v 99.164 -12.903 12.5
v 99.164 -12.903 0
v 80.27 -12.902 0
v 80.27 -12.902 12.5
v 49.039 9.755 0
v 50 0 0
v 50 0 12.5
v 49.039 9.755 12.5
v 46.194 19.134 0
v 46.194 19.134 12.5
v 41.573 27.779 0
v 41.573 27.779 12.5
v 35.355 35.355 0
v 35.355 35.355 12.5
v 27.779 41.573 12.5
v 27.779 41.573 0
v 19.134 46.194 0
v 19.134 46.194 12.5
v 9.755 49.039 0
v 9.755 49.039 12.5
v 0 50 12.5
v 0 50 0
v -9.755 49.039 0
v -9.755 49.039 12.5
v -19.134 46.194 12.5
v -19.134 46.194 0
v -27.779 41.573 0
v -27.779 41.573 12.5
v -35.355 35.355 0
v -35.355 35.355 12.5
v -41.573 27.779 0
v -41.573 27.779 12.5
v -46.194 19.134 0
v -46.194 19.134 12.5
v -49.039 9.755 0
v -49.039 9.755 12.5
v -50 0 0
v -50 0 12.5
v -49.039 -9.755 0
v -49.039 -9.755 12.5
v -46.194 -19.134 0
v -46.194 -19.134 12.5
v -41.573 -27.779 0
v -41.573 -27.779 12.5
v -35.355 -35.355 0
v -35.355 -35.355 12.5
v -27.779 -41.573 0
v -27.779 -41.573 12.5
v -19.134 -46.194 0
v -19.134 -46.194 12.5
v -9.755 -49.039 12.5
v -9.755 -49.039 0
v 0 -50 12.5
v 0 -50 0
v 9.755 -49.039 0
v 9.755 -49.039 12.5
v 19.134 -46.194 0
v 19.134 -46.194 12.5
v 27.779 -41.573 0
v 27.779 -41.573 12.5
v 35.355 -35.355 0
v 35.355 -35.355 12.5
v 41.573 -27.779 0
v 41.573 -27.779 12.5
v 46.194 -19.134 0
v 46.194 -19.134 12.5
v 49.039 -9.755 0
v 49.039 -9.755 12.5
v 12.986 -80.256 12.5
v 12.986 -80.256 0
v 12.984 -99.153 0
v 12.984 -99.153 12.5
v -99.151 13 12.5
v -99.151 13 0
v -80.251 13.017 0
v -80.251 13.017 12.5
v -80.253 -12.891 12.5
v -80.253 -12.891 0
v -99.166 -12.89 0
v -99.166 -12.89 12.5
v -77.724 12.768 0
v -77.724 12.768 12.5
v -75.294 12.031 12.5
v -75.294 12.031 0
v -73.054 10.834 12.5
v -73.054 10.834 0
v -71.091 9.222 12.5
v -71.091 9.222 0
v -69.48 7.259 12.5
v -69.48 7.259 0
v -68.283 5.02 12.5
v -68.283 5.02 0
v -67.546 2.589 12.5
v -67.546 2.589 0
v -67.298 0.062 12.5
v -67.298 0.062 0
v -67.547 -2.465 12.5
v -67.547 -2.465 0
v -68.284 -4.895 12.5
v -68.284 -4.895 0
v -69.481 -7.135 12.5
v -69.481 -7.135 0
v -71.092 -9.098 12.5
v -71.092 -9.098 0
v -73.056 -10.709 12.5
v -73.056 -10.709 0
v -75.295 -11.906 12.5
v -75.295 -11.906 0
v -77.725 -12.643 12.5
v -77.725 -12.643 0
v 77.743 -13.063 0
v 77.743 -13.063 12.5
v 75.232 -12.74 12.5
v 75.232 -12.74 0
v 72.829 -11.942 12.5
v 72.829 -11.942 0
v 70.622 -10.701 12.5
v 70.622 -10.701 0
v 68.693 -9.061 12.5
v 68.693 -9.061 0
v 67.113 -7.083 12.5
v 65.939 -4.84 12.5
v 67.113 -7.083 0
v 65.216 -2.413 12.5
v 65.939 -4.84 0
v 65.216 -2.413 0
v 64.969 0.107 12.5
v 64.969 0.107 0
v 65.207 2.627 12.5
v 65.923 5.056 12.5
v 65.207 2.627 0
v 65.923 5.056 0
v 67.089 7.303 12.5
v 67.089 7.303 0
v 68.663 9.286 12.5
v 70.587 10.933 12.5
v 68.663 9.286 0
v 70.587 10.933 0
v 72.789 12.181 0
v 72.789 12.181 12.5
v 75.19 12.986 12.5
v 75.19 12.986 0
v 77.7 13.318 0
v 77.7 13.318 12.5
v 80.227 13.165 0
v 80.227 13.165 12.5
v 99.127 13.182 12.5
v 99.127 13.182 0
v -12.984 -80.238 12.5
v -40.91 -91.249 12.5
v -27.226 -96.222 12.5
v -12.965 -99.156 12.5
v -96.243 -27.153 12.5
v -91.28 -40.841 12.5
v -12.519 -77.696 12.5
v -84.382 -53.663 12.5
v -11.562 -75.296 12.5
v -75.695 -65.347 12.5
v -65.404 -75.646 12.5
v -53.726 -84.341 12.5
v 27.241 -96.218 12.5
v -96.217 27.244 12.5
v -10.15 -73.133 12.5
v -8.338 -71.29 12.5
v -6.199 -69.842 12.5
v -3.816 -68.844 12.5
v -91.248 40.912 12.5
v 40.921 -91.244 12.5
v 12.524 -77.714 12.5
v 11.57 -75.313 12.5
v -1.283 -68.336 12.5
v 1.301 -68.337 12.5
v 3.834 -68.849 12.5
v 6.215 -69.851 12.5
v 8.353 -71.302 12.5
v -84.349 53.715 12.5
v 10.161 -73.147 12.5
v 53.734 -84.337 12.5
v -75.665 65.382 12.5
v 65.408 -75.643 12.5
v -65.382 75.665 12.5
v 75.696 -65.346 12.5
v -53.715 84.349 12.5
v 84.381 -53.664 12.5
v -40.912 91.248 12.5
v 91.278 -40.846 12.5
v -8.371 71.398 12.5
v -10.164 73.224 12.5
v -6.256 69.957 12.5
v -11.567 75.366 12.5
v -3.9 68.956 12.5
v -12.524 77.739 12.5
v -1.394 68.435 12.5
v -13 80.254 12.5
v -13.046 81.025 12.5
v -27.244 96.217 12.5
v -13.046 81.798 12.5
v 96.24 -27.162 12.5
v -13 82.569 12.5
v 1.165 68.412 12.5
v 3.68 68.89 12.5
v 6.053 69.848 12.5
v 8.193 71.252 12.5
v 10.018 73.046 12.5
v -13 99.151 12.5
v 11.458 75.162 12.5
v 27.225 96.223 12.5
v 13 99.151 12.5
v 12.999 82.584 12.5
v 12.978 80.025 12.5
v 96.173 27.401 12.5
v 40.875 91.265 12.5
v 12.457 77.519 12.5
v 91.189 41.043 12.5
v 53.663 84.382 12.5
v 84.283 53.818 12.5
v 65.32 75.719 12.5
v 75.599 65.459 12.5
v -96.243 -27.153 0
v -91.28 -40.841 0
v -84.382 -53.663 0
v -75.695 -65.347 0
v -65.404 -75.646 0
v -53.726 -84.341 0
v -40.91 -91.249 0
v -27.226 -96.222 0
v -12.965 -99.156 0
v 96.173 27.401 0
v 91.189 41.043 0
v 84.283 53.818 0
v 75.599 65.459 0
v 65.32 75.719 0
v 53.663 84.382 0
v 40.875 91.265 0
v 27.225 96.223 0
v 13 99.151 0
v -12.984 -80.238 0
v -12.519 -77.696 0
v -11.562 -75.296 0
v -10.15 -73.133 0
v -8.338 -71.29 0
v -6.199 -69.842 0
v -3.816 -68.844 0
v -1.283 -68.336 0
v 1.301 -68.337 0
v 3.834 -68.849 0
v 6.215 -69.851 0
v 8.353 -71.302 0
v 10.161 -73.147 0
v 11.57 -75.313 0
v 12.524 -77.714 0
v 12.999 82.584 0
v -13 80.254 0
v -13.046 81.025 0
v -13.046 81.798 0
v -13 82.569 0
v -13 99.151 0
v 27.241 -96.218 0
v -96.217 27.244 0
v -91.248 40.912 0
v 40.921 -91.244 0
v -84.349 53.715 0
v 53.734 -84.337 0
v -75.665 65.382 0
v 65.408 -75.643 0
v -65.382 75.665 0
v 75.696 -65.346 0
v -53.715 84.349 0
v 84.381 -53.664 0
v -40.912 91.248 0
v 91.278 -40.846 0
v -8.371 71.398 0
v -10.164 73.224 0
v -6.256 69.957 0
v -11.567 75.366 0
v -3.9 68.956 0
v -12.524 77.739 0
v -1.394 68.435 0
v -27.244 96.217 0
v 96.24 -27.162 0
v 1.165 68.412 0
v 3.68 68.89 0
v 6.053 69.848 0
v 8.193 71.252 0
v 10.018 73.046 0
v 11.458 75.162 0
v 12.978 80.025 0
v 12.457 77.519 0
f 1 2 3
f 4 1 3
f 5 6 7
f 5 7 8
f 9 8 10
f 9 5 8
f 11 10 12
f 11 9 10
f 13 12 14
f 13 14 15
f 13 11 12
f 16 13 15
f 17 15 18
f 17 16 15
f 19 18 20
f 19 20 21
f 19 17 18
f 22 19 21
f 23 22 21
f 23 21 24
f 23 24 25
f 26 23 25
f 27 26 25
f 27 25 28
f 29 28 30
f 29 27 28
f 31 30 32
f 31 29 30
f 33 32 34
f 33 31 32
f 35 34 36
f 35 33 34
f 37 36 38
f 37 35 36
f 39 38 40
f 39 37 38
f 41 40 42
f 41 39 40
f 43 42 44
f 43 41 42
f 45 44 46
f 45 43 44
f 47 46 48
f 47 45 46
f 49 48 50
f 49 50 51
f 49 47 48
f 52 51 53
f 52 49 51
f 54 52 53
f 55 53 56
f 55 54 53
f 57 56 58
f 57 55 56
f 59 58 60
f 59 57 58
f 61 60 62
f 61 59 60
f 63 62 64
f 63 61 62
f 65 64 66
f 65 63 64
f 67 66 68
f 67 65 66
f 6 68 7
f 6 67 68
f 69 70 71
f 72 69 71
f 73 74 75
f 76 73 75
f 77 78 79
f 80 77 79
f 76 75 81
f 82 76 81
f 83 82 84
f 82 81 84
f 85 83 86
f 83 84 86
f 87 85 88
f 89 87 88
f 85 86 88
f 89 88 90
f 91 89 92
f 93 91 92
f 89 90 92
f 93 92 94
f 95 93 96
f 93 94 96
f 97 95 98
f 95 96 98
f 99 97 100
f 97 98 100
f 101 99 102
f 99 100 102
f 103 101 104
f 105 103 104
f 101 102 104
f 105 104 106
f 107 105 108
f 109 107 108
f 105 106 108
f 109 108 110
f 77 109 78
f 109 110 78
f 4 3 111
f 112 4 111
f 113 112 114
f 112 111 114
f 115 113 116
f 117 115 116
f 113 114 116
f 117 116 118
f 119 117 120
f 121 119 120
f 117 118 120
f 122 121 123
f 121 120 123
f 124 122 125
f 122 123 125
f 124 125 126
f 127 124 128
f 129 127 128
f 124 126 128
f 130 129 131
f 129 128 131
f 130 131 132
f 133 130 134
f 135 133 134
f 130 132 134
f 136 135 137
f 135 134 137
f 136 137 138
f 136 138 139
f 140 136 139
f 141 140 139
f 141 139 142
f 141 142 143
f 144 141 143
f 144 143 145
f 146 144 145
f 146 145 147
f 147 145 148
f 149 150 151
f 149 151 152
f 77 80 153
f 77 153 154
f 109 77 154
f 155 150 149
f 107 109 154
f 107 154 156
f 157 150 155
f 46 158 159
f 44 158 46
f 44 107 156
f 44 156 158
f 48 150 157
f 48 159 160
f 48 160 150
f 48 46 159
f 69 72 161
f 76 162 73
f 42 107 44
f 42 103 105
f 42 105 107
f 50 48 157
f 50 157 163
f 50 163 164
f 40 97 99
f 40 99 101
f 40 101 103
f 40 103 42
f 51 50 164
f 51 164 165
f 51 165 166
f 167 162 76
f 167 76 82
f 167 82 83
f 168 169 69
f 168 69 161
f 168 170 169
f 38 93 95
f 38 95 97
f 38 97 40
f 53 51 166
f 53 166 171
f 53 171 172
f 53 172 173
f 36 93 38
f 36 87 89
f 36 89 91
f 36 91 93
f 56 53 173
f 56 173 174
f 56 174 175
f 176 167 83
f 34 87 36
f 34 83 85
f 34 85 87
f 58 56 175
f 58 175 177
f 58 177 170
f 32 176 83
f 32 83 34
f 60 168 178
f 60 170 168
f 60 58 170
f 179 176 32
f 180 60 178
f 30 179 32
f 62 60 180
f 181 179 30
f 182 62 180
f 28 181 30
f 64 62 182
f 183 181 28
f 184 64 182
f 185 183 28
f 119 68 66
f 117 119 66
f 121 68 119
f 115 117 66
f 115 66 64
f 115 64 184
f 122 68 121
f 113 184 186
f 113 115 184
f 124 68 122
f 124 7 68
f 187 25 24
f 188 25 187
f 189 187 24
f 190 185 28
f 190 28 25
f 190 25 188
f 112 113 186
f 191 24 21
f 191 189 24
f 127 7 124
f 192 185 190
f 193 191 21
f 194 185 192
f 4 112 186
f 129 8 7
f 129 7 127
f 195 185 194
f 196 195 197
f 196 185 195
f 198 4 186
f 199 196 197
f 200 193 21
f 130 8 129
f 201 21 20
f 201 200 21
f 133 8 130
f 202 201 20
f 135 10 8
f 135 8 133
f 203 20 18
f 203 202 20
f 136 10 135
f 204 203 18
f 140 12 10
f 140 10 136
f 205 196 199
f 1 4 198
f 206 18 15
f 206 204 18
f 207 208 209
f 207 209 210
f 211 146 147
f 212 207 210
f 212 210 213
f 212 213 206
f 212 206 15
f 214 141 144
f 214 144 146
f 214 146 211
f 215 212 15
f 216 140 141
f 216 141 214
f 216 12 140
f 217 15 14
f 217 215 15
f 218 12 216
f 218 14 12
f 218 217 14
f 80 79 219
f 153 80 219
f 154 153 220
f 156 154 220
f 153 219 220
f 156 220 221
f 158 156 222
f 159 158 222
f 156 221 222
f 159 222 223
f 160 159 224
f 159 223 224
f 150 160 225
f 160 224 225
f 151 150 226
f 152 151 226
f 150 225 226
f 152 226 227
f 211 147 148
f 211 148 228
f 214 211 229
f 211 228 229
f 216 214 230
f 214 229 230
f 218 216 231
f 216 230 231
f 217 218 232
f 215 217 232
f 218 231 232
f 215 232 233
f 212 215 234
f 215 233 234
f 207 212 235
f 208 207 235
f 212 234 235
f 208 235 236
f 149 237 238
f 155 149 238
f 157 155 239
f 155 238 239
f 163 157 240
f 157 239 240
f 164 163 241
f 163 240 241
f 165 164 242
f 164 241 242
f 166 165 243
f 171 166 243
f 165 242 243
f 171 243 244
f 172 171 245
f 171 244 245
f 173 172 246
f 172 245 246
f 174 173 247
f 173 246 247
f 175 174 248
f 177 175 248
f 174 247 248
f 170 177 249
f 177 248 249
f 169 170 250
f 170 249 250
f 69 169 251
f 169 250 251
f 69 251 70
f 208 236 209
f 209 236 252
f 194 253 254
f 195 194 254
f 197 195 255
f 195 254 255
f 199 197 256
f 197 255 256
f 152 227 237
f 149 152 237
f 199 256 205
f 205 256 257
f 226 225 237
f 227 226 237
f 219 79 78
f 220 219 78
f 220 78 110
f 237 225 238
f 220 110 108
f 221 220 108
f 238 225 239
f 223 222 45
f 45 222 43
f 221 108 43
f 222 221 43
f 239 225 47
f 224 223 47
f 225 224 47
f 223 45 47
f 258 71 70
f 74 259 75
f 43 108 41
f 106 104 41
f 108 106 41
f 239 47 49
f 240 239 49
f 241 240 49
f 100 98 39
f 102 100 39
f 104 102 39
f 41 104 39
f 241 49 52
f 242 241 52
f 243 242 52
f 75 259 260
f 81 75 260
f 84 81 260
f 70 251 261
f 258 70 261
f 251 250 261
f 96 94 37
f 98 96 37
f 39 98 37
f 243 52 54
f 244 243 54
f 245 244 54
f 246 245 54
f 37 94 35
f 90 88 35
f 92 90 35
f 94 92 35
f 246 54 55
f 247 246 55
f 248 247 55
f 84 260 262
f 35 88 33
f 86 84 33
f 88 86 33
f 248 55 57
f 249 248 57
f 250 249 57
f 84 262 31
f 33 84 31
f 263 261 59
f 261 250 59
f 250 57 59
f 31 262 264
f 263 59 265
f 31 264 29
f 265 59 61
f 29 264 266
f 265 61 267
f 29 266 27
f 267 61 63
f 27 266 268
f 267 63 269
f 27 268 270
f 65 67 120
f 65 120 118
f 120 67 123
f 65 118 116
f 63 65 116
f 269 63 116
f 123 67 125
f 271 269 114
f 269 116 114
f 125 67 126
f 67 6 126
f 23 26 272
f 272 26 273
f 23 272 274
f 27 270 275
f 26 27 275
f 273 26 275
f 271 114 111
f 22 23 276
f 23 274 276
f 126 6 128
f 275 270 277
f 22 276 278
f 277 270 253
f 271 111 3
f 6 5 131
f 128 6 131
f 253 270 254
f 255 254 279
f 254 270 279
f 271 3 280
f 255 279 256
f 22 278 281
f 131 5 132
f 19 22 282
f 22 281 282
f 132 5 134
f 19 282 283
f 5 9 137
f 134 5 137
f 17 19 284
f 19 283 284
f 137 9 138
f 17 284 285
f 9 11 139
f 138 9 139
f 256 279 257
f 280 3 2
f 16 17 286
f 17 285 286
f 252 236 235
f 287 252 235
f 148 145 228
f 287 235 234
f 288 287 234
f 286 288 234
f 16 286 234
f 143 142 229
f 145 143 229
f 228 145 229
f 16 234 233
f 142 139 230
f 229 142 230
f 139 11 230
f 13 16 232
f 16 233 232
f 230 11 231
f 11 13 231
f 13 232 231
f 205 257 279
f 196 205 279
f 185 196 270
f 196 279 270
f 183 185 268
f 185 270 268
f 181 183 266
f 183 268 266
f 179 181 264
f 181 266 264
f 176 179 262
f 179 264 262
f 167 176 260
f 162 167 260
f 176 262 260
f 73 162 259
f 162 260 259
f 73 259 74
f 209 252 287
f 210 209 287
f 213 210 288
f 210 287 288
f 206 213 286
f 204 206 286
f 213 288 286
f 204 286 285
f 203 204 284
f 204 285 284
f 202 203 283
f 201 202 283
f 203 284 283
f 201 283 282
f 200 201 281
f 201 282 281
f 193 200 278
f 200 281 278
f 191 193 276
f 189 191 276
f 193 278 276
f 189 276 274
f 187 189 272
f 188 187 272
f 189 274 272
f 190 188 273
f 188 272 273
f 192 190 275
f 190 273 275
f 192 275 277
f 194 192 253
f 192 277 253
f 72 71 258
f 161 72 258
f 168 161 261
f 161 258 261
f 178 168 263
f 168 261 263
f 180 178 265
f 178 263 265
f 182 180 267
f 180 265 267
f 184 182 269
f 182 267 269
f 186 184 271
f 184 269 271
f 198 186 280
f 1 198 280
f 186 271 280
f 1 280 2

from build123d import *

# Parameters (mm, degrees)
SKETCH1_R           = 50
BOSS_EXTRUDE1_DEPTH = 12.5


with BuildPart() as part:
    # Sketch1 → Boss-Extrude1 (new body)
    with BuildSketch(Plane.XY):
        with BuildLine():
            ThreePointArc((80.269796006, -12.90154445), (64.968632792, 0.106555165), (80.22704459, 13.164775589))
            Line((80.22704459, 13.164775589), (99.127347992, 13.182142467))
            ThreePointArc((99.127347992, 13.182142467), (70.645692195, 70.775604372), (13, 99.151399385))
            Line((13, 99.151399385), (12.998692028, 82.58389221))
            ThreePointArc((12.998692028, 82.58389221), (1.164991508, 68.412255439), (-13, 80.253909562))
            ThreePointArc((-13, 80.253909562), (-13.051446481, 81.411603502), (-13, 82.569297441))
            Line((-13, 82.569297441), (-13, 99.151399385))
            ThreePointArc((-13, 99.151399385), (-70.710695757, 70.71066048), (-99.151405871, 12.999950534))
            Line((-99.151405871, 12.999950534), (-80.251102468, 13.017317412))
            ThreePointArc((-80.251102468, 13.017317412), (-67.29756358, 0.062140866), (-80.252740126, -12.891398023))
            Line((-80.252740126, -12.891398023), (-99.165733386, -12.890202557))
            ThreePointArc((-99.165733386, -12.890202557), (-70.737321503, -70.684024692), (-12.964943151, -99.155989477))
            Line((-12.964943151, -99.155989477), (-12.984340134, -80.237755153))
            ThreePointArc((-12.984340134, -80.237755153), (0.009254017, -68.272284652), (12.985836125, -80.256202627))
            Line((12.985836125, -80.256202627), (12.984344225, -99.153450797))
            ThreePointArc((12.984344225, -99.153450797), (70.739768795, -70.681575469), (99.164103047, -12.902738735))
            Line((99.164103047, -12.902738735), (80.269796006, -12.90154445))
        make_face()
        Circle(SKETCH1_R, mode=Mode.SUBTRACT)
    extrude(amount=BOSS_EXTRUDE1_DEPTH)


solid = part.part
